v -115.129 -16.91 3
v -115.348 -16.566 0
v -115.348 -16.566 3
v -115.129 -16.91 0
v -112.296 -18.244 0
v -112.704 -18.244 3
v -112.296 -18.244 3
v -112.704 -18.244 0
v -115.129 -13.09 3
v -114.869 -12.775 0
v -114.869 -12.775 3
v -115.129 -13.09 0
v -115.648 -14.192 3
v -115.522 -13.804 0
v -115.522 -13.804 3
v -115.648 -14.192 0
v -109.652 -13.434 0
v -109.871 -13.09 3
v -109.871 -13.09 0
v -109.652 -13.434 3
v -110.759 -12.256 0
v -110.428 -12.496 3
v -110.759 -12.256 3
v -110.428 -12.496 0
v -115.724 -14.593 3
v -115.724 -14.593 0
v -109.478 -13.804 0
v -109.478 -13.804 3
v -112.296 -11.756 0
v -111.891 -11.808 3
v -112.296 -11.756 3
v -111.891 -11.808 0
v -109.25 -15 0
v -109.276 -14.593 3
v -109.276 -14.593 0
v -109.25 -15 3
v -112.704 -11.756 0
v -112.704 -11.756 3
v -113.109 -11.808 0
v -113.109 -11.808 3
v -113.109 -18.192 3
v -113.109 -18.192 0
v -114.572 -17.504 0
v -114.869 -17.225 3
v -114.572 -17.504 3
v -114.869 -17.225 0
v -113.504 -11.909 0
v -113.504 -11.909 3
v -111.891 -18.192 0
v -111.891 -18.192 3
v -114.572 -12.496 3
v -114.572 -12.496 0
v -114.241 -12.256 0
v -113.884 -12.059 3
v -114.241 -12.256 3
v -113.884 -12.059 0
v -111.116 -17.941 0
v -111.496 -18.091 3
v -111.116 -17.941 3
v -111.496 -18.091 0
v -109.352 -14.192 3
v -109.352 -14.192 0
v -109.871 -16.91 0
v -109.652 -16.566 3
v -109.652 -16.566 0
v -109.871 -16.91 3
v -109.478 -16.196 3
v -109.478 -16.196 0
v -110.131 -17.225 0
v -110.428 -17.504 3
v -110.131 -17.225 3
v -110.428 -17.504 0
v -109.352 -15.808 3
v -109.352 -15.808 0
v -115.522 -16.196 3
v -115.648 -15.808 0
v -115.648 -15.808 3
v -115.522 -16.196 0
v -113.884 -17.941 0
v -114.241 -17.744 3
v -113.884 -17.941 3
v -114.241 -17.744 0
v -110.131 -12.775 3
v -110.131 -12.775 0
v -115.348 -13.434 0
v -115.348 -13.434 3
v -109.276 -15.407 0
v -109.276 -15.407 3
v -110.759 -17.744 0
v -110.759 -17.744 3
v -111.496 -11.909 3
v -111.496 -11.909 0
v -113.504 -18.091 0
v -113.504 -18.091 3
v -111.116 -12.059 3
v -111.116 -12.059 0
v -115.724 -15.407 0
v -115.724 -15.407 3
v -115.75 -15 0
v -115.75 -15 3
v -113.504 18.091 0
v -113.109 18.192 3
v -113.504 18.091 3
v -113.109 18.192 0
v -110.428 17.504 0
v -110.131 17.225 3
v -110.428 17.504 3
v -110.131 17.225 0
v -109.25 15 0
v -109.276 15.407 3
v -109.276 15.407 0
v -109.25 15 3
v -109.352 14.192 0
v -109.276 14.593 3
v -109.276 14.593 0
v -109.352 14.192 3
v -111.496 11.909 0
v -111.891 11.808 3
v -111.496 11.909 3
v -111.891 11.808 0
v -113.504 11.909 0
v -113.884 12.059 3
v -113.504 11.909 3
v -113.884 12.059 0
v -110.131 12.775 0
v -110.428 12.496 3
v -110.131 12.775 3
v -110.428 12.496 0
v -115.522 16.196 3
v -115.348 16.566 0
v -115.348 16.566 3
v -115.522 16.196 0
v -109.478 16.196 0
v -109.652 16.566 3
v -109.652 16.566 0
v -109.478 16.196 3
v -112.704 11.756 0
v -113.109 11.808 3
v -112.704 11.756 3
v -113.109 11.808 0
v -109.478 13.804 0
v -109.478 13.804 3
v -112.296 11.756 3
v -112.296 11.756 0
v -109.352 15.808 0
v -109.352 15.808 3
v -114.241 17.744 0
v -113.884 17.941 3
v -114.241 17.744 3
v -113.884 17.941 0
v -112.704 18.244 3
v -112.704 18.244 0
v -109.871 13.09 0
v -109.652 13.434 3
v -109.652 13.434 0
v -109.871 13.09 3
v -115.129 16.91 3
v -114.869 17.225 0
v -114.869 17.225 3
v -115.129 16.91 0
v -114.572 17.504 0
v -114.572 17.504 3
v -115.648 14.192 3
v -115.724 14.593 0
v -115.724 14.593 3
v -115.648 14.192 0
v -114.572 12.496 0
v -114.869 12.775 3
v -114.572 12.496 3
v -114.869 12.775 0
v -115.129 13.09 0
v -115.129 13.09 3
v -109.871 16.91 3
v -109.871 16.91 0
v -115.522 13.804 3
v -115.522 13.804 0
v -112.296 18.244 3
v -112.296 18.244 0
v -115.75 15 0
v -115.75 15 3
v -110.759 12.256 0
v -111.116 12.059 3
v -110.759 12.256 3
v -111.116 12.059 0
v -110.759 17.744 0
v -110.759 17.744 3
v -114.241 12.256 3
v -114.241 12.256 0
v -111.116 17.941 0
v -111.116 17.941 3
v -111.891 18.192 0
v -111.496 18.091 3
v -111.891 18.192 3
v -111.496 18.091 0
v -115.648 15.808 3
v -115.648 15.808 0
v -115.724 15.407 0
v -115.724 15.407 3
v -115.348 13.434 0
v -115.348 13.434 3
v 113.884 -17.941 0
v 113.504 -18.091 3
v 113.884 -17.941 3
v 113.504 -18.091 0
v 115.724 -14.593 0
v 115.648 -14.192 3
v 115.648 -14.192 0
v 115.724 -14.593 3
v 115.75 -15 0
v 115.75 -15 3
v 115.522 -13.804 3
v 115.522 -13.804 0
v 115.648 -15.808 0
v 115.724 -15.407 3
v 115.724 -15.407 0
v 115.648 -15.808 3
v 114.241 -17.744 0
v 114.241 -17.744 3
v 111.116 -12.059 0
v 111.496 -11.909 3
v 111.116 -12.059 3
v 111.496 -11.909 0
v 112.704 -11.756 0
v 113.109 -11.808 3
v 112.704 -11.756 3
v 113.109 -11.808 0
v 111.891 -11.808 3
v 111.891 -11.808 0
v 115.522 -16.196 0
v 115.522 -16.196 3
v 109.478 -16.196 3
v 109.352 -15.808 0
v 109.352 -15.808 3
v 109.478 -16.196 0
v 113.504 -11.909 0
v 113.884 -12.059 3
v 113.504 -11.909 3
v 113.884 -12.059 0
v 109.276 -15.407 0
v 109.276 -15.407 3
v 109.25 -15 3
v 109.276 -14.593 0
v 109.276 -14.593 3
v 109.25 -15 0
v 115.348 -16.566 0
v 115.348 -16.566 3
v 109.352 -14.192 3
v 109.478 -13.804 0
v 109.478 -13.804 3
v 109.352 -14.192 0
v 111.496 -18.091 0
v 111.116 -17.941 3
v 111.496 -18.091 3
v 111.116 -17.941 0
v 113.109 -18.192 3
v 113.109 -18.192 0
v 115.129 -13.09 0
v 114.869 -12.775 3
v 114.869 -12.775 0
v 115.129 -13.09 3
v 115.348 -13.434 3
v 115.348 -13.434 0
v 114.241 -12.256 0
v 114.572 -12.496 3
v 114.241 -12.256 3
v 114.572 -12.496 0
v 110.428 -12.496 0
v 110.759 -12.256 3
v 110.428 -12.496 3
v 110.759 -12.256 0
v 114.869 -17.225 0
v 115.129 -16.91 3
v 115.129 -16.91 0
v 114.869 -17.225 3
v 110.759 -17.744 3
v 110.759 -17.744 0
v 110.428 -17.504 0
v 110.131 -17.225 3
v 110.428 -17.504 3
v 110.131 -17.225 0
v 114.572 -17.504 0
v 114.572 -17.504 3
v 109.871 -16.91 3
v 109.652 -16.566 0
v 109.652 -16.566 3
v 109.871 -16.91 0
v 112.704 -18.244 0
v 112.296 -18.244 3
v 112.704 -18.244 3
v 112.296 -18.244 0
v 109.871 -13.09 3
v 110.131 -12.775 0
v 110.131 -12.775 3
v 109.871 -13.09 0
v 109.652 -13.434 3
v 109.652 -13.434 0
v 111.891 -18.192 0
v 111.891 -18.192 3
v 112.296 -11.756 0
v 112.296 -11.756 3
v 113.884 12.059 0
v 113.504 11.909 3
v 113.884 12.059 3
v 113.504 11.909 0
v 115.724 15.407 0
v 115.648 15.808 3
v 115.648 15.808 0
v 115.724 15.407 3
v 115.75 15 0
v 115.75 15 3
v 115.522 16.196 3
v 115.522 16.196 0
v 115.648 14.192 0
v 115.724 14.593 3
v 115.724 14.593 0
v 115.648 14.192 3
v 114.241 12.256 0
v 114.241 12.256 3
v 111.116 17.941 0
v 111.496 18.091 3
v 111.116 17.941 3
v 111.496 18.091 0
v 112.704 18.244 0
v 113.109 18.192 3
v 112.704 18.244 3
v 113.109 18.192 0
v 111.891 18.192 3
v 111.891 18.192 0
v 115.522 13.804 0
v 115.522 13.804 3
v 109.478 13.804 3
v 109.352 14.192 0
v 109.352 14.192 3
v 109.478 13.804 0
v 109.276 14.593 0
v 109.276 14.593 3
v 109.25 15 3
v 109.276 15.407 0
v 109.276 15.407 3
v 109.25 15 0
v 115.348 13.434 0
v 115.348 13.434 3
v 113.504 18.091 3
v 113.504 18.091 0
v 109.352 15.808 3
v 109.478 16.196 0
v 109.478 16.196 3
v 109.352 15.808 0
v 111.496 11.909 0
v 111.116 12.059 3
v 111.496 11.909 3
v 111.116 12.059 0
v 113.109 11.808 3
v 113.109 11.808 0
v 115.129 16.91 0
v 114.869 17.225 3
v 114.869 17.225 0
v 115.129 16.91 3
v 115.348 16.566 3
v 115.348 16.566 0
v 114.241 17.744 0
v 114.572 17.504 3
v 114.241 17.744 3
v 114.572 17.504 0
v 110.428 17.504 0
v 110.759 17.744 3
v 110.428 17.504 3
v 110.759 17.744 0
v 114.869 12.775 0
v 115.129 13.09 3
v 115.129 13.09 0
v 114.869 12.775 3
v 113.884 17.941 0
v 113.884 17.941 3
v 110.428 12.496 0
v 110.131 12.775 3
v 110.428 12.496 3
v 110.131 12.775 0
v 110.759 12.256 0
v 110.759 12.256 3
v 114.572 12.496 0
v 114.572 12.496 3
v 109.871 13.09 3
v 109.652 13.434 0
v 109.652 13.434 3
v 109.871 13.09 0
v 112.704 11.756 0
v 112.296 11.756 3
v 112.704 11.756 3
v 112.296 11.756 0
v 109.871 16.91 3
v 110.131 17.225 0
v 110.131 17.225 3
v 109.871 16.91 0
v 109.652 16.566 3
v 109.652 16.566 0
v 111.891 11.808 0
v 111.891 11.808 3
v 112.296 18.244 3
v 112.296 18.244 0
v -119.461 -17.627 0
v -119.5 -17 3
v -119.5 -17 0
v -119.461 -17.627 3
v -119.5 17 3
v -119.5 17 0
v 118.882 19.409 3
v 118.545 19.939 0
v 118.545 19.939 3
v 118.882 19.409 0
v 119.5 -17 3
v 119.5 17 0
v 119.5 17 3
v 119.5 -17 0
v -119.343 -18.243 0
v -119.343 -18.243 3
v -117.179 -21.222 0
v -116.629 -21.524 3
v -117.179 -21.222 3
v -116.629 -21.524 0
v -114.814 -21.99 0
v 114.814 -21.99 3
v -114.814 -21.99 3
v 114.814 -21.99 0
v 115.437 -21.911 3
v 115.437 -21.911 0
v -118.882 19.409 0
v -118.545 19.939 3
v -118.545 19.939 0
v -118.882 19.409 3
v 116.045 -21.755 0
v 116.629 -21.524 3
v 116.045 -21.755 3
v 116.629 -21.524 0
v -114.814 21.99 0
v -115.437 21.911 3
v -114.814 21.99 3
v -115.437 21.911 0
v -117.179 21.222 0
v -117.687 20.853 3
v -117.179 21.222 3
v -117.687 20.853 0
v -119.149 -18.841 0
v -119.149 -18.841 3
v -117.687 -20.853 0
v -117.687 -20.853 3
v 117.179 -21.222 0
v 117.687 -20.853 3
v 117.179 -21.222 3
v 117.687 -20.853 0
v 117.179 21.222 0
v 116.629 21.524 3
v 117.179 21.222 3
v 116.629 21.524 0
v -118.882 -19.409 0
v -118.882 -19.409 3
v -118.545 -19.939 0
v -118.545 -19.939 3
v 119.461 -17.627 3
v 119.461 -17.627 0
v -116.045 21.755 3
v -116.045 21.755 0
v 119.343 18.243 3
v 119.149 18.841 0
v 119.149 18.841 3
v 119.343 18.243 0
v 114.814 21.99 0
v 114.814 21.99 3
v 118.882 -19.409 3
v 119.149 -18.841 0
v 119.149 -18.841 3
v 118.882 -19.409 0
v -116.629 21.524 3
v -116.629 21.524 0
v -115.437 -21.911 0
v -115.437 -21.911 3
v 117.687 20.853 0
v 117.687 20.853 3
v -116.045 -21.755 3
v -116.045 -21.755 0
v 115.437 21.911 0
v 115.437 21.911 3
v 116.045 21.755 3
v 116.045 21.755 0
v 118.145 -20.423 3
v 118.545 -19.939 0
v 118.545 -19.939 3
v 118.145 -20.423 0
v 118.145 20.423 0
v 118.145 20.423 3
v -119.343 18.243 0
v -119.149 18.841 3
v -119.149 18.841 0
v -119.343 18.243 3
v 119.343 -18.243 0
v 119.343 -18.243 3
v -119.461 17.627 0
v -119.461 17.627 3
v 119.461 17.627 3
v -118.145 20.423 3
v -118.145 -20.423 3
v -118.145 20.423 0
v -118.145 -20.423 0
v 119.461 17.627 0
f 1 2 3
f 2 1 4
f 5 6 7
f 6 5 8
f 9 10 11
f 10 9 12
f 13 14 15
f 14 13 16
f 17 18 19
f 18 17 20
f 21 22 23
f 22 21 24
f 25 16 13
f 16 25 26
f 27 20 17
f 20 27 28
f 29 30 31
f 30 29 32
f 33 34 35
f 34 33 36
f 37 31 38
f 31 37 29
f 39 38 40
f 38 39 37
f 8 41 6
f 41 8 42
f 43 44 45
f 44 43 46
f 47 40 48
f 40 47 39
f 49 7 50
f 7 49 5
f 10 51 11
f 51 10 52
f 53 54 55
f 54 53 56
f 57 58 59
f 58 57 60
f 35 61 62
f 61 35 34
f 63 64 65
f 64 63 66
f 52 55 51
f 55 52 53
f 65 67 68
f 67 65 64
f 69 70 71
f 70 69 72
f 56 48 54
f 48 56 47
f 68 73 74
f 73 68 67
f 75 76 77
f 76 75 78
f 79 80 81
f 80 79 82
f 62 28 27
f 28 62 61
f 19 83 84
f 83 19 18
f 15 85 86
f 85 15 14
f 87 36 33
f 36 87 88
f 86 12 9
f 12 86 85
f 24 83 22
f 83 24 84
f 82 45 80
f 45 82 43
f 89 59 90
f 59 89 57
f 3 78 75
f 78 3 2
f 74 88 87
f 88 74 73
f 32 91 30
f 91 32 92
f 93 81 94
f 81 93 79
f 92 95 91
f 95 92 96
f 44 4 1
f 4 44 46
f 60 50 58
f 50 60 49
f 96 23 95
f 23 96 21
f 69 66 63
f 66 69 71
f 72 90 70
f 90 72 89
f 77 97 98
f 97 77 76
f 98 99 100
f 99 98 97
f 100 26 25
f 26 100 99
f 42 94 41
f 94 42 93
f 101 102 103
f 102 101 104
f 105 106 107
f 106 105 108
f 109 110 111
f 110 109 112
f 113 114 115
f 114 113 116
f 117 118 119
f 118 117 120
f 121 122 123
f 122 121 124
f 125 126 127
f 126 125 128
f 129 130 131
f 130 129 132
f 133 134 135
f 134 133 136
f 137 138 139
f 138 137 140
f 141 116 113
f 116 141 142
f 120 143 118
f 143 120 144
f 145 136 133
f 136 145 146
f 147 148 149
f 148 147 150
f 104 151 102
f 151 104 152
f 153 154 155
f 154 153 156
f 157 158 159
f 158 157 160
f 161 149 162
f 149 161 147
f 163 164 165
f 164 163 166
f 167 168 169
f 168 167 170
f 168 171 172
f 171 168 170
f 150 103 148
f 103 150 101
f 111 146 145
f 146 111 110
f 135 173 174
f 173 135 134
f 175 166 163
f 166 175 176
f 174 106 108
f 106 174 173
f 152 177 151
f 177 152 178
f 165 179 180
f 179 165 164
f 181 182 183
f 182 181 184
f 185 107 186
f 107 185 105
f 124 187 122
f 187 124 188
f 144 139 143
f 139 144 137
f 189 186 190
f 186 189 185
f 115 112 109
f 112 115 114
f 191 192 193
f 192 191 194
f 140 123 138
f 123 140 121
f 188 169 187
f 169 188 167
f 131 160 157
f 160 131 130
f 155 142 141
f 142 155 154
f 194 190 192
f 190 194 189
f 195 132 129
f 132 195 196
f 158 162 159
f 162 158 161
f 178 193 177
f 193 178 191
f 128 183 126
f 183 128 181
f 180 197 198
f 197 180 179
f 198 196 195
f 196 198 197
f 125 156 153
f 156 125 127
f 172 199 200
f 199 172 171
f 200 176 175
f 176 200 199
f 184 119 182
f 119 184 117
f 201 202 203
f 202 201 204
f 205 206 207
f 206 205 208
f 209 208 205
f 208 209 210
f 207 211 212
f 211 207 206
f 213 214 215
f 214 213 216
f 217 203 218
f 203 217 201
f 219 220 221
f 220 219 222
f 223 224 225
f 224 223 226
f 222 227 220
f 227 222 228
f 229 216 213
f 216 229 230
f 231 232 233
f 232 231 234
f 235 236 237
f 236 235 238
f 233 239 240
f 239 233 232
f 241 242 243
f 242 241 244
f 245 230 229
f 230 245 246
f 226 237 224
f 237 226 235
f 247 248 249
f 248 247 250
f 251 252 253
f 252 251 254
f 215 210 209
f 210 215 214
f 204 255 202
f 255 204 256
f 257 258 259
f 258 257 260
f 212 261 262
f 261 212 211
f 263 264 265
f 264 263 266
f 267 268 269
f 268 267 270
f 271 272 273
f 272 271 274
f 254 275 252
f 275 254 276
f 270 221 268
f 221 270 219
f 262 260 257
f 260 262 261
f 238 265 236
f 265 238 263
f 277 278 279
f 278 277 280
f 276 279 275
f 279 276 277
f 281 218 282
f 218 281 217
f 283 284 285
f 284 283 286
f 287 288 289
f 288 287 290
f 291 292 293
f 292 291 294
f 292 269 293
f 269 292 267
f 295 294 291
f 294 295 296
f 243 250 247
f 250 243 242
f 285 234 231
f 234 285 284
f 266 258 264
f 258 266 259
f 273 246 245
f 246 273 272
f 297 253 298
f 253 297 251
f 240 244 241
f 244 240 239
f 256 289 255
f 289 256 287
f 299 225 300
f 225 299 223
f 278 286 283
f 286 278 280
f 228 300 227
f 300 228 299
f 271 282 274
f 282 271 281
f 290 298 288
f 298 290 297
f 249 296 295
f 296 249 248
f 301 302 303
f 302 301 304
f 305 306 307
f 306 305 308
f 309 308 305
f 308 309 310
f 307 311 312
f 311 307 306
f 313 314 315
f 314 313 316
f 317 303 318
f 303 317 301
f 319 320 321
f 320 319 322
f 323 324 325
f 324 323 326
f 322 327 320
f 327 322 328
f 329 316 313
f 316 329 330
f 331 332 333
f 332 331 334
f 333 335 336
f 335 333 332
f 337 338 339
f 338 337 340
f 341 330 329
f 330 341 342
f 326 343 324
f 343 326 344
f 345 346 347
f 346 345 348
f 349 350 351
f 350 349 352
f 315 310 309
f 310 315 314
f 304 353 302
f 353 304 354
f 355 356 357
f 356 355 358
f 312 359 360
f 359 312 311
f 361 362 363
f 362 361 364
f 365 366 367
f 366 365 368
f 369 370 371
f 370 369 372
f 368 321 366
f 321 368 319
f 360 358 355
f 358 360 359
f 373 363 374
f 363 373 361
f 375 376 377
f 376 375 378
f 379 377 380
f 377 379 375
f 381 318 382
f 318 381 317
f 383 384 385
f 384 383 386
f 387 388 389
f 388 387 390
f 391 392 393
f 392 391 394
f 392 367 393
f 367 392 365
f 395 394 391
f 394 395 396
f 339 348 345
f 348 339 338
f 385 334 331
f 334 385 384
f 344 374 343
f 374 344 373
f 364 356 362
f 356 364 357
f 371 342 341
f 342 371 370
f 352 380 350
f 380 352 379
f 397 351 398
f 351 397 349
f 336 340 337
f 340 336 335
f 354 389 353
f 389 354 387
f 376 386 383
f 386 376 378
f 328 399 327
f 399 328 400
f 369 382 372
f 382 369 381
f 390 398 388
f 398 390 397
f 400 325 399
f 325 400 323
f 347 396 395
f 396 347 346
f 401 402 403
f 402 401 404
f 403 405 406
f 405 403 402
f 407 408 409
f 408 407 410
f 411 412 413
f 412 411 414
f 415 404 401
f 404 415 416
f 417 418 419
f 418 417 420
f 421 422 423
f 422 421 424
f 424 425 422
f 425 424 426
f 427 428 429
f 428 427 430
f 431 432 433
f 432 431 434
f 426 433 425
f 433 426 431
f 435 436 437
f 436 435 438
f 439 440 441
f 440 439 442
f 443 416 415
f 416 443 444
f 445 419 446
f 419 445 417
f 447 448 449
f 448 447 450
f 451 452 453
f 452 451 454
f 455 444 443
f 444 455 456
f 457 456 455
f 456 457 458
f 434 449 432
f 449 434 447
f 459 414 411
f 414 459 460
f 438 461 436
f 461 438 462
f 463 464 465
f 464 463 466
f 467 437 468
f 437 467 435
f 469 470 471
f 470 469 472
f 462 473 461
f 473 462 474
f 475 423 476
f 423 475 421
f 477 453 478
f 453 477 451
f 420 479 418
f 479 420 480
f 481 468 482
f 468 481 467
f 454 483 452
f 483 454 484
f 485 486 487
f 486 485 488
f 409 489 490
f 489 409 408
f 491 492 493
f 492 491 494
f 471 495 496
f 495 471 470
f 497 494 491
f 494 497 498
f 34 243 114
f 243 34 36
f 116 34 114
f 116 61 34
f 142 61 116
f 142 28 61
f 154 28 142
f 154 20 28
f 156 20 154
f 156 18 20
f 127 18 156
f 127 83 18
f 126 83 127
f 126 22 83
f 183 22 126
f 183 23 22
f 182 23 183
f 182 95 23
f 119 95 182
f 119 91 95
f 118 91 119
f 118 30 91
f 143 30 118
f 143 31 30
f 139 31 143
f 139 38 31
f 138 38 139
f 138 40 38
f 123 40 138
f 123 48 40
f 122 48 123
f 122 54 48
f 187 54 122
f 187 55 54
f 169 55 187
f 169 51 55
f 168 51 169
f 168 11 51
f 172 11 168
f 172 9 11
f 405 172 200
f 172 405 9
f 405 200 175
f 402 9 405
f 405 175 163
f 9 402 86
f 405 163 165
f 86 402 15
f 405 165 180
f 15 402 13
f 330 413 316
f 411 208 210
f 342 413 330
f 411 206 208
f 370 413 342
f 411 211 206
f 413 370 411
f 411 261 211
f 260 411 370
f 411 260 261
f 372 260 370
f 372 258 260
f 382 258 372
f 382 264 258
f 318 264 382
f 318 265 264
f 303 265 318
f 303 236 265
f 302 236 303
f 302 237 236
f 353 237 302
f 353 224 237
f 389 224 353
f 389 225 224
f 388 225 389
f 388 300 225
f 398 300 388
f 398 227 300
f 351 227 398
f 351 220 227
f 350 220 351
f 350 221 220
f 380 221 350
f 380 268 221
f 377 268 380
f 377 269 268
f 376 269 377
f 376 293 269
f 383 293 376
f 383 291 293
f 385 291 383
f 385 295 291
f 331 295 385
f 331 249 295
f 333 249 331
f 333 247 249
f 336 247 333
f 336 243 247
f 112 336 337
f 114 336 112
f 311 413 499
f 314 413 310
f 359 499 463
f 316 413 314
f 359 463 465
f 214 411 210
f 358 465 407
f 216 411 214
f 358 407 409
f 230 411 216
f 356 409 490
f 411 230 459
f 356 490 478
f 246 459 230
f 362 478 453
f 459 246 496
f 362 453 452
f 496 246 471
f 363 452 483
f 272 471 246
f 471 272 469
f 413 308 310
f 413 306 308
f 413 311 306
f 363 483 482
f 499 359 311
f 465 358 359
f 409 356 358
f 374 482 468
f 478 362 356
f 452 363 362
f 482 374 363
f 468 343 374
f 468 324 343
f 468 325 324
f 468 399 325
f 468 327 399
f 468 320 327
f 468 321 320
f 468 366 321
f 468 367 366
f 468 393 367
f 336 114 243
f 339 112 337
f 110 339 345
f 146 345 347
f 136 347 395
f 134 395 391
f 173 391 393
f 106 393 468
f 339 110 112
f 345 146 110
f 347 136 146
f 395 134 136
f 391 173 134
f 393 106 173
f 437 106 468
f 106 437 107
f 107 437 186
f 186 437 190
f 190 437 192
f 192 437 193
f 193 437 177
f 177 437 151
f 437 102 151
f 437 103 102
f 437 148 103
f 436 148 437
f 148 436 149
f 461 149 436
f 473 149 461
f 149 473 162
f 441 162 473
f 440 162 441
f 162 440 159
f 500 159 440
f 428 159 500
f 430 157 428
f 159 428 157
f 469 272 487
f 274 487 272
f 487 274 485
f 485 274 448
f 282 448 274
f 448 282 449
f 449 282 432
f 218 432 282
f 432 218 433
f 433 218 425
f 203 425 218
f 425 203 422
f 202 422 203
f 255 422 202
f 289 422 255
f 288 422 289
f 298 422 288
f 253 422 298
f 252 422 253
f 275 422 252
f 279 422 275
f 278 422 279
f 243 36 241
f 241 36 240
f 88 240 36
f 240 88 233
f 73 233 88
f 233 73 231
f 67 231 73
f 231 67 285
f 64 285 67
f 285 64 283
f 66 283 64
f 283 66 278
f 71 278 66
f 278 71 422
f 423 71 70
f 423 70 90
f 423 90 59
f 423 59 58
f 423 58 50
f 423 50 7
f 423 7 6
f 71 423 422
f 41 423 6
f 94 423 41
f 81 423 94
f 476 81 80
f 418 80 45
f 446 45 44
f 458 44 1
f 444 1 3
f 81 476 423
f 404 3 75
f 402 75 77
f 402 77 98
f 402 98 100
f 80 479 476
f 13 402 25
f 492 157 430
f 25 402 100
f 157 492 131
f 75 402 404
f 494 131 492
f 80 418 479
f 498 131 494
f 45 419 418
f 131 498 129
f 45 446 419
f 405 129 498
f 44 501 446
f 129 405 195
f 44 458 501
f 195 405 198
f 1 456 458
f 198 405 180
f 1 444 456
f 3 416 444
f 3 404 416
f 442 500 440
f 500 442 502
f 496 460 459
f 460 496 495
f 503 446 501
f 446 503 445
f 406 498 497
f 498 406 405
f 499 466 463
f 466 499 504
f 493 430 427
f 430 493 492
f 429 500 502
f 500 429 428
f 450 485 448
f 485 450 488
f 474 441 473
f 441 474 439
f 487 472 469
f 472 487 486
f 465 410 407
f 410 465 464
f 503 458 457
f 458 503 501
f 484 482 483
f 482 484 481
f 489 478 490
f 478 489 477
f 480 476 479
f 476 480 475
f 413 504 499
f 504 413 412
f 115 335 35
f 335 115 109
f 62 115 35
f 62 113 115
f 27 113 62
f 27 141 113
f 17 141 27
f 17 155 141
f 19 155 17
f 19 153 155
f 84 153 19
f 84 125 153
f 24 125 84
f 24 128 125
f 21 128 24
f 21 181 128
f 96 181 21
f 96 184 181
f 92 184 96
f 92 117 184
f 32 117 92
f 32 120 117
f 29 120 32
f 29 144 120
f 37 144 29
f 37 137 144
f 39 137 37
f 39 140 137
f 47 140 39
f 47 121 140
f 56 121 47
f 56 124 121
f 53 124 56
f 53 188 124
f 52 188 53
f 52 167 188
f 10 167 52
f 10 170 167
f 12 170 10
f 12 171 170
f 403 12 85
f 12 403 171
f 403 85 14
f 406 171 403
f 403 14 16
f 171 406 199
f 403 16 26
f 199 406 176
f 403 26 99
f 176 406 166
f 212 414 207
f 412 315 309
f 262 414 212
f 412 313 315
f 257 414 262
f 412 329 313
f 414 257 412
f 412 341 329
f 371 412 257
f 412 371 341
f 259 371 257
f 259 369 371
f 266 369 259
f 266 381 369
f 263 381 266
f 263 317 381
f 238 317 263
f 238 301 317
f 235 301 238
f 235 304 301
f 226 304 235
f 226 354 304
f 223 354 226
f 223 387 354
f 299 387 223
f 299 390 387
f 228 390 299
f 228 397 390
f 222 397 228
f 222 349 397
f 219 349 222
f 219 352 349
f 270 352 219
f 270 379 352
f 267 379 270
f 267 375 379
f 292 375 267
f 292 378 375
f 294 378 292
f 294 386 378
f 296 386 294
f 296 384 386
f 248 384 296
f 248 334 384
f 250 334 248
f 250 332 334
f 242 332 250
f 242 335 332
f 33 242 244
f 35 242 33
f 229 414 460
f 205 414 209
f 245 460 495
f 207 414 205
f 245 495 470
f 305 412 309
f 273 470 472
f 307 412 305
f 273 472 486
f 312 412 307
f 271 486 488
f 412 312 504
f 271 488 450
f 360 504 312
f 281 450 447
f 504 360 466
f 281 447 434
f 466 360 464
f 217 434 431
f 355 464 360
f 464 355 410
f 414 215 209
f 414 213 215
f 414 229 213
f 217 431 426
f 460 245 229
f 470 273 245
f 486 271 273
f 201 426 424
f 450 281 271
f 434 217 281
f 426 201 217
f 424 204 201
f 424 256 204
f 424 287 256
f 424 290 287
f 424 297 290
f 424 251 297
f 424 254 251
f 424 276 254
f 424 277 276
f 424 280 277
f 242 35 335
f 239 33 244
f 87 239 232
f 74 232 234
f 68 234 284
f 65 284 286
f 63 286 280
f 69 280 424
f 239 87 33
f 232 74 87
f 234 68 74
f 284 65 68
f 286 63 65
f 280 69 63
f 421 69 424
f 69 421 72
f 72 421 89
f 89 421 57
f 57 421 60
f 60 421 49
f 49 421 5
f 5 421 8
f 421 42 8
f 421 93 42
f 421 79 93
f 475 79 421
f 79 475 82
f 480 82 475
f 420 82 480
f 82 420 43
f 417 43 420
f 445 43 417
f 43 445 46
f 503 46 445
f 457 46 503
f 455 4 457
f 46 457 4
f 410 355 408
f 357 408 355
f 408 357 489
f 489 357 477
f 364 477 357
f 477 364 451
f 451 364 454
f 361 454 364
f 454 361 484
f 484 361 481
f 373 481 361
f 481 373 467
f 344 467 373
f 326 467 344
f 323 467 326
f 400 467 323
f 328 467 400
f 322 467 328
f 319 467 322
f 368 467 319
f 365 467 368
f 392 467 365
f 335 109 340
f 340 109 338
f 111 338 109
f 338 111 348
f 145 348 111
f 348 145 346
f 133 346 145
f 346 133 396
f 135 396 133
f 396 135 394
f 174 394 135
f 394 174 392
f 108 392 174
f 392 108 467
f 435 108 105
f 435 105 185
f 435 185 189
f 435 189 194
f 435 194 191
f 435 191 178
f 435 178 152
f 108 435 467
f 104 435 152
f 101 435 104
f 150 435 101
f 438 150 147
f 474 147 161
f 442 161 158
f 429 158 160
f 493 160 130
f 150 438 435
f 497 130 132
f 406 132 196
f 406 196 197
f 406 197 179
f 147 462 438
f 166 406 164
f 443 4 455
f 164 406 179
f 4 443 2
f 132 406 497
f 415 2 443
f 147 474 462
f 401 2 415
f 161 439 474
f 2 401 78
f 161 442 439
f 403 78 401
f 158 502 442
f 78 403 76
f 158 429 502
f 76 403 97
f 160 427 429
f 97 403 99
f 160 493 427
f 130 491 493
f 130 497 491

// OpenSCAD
$fn = 50;


difference() {
	union() {
		hull() {
			translate(v = [-114.5000000000, 17.0000000000, 0]) {
				cylinder(h = 3, r = 5);
			}
			translate(v = [114.5000000000, 17.0000000000, 0]) {
				cylinder(h = 3, r = 5);
			}
			translate(v = [-114.5000000000, -17.0000000000, 0]) {
				cylinder(h = 3, r = 5);
			}
			translate(v = [114.5000000000, -17.0000000000, 0]) {
				cylinder(h = 3, r = 5);
			}
		}
	}
	union() {
		translate(v = [-112.5000000000, -15.0000000000, -100.0000000000]) {
			cylinder(h = 200, r = 3.2500000000);
		}
		translate(v = [-112.5000000000, 15.0000000000, -100.0000000000]) {
			cylinder(h = 200, r = 3.2500000000);
		}
		translate(v = [112.5000000000, -15.0000000000, -100.0000000000]) {
			cylinder(h = 200, r = 3.2500000000);
		}
		translate(v = [112.5000000000, 15.0000000000, -100.0000000000]) {
			cylinder(h = 200, r = 3.2500000000);
		}
	}
}
